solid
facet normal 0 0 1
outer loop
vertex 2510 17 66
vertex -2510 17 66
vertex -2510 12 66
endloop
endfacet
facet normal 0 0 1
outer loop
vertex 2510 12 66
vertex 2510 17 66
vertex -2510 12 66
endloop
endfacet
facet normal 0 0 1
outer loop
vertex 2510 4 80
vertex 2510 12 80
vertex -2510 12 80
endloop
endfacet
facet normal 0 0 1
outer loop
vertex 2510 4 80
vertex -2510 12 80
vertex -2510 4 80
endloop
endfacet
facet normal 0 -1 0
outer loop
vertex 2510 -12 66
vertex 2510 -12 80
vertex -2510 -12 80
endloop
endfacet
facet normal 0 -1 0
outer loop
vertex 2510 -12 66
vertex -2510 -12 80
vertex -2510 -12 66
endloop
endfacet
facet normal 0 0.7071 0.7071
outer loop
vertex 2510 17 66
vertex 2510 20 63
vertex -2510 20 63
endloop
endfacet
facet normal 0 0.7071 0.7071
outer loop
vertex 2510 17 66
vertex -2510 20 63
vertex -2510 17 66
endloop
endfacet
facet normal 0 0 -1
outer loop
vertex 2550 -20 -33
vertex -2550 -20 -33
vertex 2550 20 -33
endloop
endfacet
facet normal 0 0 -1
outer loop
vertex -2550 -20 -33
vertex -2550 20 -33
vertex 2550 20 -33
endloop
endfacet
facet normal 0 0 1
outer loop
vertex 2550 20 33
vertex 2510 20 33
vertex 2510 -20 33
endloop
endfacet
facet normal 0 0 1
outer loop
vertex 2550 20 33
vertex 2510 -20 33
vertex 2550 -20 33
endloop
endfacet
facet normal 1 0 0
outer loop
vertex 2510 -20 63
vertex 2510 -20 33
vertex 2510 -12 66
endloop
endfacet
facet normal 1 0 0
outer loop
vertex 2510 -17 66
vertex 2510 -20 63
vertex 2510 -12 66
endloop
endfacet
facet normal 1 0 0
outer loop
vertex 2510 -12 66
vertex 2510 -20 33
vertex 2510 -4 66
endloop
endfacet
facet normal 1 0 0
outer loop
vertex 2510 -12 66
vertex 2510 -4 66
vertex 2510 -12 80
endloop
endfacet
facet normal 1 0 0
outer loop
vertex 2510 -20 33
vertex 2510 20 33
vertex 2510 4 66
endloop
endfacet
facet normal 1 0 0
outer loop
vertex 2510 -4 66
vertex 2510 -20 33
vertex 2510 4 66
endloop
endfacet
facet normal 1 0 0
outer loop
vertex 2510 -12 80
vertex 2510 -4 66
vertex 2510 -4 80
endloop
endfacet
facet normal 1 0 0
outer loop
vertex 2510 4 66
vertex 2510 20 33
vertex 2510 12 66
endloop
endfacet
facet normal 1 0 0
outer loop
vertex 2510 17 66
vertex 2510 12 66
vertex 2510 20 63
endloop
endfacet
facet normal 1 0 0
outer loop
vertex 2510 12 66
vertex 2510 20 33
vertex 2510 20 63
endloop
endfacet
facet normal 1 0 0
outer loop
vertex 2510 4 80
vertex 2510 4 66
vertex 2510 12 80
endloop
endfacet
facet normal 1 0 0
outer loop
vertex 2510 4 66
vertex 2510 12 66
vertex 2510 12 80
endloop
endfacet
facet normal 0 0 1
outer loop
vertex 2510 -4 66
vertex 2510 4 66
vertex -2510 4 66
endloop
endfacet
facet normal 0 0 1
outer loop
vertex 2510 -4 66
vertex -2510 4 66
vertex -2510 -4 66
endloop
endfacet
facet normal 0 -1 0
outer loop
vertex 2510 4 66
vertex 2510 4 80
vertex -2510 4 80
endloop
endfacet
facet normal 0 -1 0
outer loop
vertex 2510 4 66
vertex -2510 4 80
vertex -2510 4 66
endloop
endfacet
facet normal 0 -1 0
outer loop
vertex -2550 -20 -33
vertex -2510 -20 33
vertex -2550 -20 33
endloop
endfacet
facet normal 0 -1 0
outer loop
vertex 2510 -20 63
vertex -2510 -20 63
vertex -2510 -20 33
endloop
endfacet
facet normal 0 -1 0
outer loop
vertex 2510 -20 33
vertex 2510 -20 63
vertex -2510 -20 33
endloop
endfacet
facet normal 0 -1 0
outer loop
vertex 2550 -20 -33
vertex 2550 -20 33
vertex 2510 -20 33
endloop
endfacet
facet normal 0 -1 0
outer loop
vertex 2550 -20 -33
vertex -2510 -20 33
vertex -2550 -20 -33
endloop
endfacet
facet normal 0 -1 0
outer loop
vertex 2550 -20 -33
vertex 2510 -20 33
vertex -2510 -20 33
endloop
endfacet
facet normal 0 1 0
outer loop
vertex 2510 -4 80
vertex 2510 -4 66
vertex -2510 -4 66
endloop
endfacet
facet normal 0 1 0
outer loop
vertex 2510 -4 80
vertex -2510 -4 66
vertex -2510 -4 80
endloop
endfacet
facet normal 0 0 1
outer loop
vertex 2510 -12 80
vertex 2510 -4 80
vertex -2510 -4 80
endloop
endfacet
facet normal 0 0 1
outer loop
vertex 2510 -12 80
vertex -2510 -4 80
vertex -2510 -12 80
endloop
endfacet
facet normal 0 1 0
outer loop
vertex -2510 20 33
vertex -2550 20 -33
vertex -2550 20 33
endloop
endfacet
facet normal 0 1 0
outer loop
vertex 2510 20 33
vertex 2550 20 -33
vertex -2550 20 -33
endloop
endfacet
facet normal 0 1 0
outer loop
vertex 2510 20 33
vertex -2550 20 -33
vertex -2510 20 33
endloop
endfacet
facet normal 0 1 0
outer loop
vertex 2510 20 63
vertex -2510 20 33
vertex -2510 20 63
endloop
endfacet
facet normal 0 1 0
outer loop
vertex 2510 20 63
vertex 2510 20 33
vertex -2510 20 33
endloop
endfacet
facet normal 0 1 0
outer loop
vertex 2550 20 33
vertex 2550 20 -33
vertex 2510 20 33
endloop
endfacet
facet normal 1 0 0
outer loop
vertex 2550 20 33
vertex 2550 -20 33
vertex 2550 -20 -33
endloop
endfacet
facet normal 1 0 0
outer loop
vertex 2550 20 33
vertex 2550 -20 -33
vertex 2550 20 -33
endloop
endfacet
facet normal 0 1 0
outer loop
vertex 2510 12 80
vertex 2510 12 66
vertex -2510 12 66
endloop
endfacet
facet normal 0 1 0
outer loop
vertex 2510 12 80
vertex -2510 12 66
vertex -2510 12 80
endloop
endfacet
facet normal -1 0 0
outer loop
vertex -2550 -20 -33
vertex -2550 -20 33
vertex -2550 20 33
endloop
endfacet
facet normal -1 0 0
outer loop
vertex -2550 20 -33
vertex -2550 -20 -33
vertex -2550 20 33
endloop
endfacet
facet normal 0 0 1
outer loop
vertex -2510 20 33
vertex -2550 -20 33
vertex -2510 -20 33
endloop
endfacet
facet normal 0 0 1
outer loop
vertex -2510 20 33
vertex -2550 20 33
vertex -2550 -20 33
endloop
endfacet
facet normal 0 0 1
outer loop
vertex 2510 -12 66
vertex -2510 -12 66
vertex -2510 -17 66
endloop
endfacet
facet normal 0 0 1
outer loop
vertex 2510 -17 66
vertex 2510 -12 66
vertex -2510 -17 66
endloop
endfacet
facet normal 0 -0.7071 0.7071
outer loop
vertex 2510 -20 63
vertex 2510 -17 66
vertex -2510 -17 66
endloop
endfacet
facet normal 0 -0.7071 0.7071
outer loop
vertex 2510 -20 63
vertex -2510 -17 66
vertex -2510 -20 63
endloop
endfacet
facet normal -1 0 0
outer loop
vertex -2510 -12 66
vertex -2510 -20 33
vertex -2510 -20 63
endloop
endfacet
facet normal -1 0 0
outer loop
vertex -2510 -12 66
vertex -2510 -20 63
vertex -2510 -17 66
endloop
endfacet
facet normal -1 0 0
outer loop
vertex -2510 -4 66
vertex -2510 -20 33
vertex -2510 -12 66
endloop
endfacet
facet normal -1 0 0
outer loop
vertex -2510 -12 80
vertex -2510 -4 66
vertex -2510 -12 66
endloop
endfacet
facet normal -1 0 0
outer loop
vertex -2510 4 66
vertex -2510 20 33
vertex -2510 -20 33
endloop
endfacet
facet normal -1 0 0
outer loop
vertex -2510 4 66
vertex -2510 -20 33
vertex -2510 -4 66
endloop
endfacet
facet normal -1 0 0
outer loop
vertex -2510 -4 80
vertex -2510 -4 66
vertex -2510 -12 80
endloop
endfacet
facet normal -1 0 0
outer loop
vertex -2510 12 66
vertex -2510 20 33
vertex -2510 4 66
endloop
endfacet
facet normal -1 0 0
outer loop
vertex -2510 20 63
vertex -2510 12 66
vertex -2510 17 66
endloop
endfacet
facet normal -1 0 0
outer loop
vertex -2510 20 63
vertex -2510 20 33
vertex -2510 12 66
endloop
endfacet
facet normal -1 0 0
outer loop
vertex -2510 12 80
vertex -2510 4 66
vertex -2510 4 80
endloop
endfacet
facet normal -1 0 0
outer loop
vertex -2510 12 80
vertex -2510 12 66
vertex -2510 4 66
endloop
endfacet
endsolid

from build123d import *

# Parameters (mm, degrees)
F1_W     = 40
F1_H     = 33
F3_DEPTH = 2550
F2_W     = 80
F2_H     = 100
F4_DEPTH = 25
F5_W     = 5020
F5_H     = 19
F6_DEPTH = 40


with BuildPart() as f3:
    # F1 (on Right) → F3 (new body, symmetric)
    with BuildSketch(Plane.YZ):
        Polygon((20, 33), (20, 63), (17, 66), (12, 66), (12, 80), (4, 80), (4, 66), (-4, 66), (-4, 80), (-12, 80), (-12, 66), (-17, 66), (-20, 63), (-20, 33), align=None)
        with Locations((0, 16.5)):
            Rectangle(F1_W, F1_H)
        with Locations((0, -16.5)):
            Rectangle(F1_W, F1_H)
        Polygon((20, -52), (20, -33), (-20, -33), (-20, -52), (-12, -52), (-4, -52), (4, -52), (12, -52), align=None)
    extrude(amount=F3_DEPTH, both=True)

    # F2 (on Front) → F4 (cut, symmetric)
    with BuildSketch(Plane.XZ):
        with Locations((-2550, 83)):
            Rectangle(F2_W, F2_H)
        with Locations((-2550, -83)):
            Rectangle(F2_W, F2_H)
        with Locations((2550, 83)):
            Rectangle(F2_W, F2_H)
        with Locations((2550, -83)):
            Rectangle(F2_W, F2_H)
    extrude(amount=F4_DEPTH, both=True, mode=Mode.SUBTRACT)

    # F5 (on face) → F6 (cut, through all)
    with BuildSketch(Plane.XZ.offset(20)):
        with Locations((0, -42.5)):
            Rectangle(F5_W, F5_H)
    extrude(amount=-F6_DEPTH, mode=Mode.SUBTRACT)


solid = f3.part
